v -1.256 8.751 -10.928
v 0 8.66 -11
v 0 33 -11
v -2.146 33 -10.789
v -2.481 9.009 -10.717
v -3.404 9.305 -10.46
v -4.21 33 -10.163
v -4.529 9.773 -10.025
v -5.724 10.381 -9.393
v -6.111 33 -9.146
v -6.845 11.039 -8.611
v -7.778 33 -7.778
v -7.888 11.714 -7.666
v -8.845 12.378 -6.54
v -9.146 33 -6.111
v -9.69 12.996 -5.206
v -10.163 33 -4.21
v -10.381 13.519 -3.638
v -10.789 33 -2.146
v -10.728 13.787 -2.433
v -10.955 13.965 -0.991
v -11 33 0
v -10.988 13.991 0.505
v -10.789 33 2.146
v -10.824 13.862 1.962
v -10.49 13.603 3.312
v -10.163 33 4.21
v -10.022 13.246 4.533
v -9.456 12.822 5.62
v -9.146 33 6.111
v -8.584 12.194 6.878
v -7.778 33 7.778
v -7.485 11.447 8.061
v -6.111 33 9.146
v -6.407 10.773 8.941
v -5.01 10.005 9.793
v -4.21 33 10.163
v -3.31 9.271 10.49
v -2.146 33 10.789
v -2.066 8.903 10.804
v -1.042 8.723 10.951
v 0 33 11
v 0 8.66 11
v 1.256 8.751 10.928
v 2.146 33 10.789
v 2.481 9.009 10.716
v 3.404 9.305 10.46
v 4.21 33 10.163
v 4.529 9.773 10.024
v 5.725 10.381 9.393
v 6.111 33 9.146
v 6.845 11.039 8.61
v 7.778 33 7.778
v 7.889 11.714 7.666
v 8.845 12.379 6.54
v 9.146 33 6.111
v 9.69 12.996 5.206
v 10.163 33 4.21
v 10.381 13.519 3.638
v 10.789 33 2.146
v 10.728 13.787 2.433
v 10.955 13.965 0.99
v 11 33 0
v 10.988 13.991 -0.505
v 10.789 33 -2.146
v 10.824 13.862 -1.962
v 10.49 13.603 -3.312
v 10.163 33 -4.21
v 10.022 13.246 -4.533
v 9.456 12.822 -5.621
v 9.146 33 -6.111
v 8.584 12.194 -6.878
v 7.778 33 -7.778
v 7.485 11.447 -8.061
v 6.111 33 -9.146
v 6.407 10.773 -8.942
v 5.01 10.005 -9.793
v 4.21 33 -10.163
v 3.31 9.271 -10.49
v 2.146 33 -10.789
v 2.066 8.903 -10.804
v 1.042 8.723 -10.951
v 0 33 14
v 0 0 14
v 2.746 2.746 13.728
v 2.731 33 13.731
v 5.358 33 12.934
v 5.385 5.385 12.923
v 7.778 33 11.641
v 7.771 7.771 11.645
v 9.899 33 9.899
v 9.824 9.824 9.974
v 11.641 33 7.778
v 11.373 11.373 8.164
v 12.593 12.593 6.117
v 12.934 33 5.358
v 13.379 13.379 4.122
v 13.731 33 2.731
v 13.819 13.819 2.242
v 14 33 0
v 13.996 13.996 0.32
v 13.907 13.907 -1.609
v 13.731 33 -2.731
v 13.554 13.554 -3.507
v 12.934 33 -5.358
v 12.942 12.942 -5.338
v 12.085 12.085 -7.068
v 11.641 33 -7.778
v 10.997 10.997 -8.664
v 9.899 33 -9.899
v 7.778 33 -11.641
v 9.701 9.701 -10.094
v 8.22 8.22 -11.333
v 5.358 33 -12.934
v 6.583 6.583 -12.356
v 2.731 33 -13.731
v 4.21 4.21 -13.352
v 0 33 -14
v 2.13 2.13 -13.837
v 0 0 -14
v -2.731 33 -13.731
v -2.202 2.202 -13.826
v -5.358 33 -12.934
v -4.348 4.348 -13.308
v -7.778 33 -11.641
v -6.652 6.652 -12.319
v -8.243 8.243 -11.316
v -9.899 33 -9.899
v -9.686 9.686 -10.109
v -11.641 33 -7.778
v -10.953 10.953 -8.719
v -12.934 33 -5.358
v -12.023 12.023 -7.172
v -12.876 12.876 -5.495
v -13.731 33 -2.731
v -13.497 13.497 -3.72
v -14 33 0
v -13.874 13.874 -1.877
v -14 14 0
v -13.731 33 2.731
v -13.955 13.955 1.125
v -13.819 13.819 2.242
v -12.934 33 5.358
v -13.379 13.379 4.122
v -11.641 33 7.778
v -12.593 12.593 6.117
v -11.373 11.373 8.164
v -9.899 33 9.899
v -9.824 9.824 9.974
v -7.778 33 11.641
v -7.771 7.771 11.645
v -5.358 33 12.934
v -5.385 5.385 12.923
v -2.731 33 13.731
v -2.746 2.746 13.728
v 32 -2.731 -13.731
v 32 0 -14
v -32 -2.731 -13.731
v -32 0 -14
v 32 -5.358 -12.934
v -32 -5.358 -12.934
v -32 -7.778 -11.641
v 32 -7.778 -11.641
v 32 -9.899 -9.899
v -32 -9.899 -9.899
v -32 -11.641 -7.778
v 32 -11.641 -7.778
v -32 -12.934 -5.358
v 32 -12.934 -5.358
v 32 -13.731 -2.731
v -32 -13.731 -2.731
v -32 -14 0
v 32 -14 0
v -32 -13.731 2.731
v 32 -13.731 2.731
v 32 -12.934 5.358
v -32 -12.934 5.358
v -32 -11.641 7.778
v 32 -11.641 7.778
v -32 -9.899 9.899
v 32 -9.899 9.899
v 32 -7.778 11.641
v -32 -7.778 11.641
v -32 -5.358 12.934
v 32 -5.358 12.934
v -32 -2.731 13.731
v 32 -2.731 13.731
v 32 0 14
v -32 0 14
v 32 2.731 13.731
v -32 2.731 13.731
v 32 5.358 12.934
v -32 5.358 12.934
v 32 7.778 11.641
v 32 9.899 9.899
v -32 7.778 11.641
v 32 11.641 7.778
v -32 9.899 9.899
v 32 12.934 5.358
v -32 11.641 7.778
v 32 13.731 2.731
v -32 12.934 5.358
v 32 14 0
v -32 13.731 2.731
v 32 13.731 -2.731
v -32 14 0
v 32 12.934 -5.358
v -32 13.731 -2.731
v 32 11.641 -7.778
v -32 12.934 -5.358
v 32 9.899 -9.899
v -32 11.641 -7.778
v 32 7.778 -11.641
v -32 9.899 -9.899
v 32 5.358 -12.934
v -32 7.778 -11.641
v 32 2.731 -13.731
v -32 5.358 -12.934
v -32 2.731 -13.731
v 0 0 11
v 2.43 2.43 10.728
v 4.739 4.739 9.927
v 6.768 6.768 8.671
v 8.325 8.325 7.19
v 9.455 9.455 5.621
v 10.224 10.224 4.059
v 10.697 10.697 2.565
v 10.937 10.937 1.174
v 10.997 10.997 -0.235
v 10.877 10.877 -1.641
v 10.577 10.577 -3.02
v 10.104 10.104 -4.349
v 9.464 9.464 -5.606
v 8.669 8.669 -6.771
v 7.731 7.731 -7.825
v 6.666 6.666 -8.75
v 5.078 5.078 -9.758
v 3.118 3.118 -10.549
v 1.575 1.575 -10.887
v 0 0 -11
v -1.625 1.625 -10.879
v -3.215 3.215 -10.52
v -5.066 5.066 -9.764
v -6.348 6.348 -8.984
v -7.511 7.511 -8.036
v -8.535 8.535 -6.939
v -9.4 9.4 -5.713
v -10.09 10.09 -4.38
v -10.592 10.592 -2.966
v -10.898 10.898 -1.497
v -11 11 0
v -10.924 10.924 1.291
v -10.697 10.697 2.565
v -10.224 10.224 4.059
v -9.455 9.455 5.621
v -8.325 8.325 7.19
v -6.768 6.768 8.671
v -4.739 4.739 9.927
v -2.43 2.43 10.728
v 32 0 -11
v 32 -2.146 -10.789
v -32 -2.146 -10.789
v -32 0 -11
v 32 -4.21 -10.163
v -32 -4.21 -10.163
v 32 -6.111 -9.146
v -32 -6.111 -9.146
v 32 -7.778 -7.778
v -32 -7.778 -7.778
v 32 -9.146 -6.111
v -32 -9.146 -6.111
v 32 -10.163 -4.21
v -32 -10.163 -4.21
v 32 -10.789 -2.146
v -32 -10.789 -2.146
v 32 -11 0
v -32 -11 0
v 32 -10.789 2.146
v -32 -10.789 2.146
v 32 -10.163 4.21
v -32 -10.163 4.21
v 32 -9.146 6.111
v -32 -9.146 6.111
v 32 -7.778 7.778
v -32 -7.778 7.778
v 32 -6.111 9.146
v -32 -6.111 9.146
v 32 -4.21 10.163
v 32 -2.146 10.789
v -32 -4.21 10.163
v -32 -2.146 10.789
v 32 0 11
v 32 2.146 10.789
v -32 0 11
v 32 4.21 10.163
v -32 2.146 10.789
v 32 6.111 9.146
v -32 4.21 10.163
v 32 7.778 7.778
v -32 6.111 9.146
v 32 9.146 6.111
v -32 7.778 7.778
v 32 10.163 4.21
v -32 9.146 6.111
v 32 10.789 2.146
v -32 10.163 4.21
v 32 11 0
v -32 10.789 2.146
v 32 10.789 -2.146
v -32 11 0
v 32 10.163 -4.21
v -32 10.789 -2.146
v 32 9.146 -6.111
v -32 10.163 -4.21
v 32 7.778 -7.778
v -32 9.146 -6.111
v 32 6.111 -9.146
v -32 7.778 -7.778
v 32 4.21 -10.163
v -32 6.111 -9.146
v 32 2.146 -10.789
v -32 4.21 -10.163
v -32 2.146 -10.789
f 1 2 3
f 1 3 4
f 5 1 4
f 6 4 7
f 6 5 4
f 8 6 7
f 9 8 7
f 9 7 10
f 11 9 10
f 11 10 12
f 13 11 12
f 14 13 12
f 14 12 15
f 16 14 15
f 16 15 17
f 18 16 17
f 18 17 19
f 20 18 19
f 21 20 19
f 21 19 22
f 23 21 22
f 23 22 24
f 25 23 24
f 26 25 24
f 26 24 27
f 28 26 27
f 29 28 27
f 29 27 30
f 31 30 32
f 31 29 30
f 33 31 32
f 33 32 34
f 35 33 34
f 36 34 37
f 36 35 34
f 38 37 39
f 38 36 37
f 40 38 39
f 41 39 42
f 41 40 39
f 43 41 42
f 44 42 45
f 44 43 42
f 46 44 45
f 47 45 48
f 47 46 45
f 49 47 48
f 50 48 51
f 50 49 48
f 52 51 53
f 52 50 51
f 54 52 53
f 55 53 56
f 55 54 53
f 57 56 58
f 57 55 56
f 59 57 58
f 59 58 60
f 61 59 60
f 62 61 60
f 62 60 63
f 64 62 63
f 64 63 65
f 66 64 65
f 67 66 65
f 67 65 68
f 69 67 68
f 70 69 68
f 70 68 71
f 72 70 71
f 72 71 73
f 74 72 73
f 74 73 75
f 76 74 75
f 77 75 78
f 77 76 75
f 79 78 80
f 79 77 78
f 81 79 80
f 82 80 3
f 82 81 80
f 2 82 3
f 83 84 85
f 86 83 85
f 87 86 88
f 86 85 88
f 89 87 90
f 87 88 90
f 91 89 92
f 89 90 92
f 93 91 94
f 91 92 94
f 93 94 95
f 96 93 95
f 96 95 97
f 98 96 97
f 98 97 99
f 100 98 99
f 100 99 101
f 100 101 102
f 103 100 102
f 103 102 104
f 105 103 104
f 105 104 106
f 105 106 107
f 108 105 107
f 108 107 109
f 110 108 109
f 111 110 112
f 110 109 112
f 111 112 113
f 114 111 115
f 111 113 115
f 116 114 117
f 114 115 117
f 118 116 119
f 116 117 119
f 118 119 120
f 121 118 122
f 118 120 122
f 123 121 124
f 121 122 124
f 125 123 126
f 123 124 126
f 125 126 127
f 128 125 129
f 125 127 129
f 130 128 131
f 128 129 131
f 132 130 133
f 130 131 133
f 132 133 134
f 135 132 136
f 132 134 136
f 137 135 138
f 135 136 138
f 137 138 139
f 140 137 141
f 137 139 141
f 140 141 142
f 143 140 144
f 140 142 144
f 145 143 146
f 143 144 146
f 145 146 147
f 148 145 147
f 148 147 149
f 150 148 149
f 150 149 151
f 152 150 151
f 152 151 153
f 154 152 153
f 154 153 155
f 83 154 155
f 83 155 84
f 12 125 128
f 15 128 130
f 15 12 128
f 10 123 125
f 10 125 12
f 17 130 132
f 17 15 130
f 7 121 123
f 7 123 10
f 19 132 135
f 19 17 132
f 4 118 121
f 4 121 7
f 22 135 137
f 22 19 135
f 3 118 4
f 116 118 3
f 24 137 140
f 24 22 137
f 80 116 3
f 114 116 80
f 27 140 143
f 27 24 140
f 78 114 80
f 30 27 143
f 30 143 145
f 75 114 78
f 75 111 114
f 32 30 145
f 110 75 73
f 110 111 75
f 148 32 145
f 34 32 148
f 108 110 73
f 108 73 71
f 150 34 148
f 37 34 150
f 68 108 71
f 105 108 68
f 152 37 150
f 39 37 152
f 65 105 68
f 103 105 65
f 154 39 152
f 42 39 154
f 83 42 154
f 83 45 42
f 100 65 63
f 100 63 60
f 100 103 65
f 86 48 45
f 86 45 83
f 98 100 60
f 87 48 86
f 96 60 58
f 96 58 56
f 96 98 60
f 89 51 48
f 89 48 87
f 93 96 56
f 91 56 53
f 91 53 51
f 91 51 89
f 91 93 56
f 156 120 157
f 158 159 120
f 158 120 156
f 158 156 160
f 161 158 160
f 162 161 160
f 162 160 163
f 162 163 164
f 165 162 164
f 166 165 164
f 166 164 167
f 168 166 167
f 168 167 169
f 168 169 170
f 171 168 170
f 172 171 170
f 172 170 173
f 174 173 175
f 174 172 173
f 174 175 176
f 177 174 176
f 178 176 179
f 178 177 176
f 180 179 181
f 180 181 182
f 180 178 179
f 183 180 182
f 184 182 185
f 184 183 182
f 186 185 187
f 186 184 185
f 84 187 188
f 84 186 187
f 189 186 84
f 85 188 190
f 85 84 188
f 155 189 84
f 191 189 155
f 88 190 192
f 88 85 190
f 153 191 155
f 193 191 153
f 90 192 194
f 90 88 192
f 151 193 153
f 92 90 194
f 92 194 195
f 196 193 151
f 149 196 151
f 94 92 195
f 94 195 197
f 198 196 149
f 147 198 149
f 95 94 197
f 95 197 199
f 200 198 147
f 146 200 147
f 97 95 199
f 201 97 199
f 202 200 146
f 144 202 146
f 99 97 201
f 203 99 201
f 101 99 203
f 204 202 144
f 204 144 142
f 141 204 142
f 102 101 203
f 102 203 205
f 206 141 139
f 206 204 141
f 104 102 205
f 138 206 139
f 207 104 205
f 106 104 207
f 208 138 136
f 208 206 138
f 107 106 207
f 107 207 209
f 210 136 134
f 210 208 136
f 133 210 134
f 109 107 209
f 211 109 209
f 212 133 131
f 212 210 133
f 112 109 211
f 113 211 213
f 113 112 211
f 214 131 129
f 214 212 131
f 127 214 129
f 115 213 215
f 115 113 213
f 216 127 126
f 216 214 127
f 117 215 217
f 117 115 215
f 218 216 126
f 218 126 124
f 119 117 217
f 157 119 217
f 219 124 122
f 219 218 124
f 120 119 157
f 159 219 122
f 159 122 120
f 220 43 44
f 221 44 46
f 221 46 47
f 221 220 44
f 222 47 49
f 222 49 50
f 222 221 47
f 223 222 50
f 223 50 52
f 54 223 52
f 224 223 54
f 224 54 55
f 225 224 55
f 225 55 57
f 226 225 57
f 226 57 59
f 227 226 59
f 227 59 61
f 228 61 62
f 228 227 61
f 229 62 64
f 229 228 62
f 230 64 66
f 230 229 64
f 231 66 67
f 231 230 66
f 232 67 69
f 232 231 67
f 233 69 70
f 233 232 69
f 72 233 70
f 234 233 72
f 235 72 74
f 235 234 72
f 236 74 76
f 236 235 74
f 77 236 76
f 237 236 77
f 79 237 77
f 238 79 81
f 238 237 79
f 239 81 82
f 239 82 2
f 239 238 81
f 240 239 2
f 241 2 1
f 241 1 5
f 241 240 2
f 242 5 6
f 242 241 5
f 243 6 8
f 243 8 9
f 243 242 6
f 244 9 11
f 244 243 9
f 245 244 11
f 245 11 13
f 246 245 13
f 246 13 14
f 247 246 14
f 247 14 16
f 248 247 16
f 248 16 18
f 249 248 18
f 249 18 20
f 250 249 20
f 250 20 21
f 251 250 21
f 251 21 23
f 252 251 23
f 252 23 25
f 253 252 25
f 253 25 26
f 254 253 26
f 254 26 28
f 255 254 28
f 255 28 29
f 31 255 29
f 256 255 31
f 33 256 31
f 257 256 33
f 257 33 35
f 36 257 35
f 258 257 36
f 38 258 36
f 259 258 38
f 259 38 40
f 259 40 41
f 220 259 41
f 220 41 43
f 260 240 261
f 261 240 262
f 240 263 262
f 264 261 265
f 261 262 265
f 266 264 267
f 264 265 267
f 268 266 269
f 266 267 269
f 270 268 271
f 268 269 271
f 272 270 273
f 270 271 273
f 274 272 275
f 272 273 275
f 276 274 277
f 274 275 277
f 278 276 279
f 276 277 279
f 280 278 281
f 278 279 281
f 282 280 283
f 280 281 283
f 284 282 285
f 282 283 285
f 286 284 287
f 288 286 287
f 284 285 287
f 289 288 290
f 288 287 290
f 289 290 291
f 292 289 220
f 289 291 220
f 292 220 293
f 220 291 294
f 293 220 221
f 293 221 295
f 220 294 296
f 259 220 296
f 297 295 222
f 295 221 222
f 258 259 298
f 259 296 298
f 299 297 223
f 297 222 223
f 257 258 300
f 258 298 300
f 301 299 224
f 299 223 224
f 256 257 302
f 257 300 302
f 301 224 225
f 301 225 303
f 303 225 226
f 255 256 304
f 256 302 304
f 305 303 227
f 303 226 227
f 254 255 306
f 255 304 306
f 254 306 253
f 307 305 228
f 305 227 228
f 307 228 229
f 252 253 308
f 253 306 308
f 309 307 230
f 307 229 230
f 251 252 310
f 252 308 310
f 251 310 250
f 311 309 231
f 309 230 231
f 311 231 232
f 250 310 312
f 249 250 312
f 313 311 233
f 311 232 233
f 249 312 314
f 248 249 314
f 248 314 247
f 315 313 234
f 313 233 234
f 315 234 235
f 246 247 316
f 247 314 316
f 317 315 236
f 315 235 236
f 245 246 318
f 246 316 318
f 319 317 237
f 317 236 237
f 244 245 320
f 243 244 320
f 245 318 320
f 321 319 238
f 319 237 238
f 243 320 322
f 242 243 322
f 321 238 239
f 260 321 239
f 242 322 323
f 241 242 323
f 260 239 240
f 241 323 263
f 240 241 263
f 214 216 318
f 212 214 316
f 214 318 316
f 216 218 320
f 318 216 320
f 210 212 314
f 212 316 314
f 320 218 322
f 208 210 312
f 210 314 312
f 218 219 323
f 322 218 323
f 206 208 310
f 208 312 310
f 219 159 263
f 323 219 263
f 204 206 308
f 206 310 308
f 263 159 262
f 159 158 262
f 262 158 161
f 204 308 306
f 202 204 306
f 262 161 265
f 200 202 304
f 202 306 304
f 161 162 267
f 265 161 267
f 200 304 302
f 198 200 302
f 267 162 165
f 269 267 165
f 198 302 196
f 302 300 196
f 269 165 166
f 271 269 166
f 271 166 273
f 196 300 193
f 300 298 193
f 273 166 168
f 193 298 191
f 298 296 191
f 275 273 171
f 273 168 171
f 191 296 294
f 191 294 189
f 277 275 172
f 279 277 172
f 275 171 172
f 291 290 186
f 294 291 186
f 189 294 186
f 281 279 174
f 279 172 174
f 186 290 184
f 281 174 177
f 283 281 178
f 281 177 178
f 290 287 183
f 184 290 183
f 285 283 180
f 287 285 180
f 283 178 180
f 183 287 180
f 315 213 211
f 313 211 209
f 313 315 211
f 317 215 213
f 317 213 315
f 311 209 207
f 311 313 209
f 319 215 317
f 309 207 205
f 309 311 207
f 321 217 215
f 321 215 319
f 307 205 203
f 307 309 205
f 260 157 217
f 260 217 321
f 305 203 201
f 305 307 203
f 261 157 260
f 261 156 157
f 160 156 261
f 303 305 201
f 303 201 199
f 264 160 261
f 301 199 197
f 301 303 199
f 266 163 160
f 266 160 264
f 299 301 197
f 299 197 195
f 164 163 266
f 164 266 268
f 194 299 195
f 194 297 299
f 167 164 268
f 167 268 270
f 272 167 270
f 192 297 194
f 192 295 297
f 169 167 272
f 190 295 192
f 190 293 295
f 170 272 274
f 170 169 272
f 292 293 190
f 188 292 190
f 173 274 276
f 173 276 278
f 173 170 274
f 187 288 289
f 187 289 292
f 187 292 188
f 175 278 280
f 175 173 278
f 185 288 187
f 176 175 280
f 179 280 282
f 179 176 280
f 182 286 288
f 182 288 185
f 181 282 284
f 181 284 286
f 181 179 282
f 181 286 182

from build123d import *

# Parameters (mm, degrees)
SKETCH3_R           = 14
SKETCH3_R_2         = 11
SKETCH5_R           = 14
SKETCH5_R_2         = 11
BOSS_EXTRUDE1_DEPTH = 33
SKETCH6_R           = 11
CUT_EXTRUDE1_DEPTH  = 53
CUT_EXTRUDE2_START  = -33
SKETCH7_R           = 11
CUT_EXTRUDE2_DEPTH  = 33


with BuildPart() as part:
    # Sweep1: sweep along a path in Sketch1
    with BuildLine(Plane.XY) as sweep1_path:
        Line((32, 0), (-32, 0))
    # Sketch3 → Sweep1 (sweep)
    with BuildSketch(Plane(origin=(32, 0, 0), x_dir=(0, 0, -1), z_dir=(1, 0, 0))):
        Circle(SKETCH3_R)
        Circle(SKETCH3_R_2, mode=Mode.SUBTRACT)
    sweep(path=sweep1_path.line)

    # Sketch5 → Boss-Extrude1 (add)
    with BuildSketch(Plane(origin=(0, 0, 0), x_dir=(1, 0, 0), z_dir=(0, 1, 0))):
        with Locations(Location((0, 0, 0), (0, 0, 270))):
            Circle(SKETCH5_R)
        with Locations(Location((0, 0, 0), (0, 0, 90))):
            Circle(SKETCH5_R_2, mode=Mode.SUBTRACT)
    extrude(amount=BOSS_EXTRUDE1_DEPTH)

    # Sketch6 → Cut-Extrude1 (cut)
    with BuildSketch(Plane.ZY.offset(32)):
        with Locations(Location((0, 0, 0), (0, 0, 180))):
            Circle(SKETCH6_R)
    extrude(amount=-CUT_EXTRUDE1_DEPTH, mode=Mode.SUBTRACT)

    # Sketch7 → Cut-Extrude2 (cut)
    with BuildSketch(Plane(origin=(0, 33, 0), x_dir=(1, 0, 0), z_dir=(0, 1, 0)).offset(CUT_EXTRUDE2_START)):
        with Locations(Location((0, 0, 0), (0, 0, 270))):
            Circle(SKETCH7_R)
    extrude(amount=CUT_EXTRUDE2_DEPTH, mode=Mode.SUBTRACT)


solid = part.part
